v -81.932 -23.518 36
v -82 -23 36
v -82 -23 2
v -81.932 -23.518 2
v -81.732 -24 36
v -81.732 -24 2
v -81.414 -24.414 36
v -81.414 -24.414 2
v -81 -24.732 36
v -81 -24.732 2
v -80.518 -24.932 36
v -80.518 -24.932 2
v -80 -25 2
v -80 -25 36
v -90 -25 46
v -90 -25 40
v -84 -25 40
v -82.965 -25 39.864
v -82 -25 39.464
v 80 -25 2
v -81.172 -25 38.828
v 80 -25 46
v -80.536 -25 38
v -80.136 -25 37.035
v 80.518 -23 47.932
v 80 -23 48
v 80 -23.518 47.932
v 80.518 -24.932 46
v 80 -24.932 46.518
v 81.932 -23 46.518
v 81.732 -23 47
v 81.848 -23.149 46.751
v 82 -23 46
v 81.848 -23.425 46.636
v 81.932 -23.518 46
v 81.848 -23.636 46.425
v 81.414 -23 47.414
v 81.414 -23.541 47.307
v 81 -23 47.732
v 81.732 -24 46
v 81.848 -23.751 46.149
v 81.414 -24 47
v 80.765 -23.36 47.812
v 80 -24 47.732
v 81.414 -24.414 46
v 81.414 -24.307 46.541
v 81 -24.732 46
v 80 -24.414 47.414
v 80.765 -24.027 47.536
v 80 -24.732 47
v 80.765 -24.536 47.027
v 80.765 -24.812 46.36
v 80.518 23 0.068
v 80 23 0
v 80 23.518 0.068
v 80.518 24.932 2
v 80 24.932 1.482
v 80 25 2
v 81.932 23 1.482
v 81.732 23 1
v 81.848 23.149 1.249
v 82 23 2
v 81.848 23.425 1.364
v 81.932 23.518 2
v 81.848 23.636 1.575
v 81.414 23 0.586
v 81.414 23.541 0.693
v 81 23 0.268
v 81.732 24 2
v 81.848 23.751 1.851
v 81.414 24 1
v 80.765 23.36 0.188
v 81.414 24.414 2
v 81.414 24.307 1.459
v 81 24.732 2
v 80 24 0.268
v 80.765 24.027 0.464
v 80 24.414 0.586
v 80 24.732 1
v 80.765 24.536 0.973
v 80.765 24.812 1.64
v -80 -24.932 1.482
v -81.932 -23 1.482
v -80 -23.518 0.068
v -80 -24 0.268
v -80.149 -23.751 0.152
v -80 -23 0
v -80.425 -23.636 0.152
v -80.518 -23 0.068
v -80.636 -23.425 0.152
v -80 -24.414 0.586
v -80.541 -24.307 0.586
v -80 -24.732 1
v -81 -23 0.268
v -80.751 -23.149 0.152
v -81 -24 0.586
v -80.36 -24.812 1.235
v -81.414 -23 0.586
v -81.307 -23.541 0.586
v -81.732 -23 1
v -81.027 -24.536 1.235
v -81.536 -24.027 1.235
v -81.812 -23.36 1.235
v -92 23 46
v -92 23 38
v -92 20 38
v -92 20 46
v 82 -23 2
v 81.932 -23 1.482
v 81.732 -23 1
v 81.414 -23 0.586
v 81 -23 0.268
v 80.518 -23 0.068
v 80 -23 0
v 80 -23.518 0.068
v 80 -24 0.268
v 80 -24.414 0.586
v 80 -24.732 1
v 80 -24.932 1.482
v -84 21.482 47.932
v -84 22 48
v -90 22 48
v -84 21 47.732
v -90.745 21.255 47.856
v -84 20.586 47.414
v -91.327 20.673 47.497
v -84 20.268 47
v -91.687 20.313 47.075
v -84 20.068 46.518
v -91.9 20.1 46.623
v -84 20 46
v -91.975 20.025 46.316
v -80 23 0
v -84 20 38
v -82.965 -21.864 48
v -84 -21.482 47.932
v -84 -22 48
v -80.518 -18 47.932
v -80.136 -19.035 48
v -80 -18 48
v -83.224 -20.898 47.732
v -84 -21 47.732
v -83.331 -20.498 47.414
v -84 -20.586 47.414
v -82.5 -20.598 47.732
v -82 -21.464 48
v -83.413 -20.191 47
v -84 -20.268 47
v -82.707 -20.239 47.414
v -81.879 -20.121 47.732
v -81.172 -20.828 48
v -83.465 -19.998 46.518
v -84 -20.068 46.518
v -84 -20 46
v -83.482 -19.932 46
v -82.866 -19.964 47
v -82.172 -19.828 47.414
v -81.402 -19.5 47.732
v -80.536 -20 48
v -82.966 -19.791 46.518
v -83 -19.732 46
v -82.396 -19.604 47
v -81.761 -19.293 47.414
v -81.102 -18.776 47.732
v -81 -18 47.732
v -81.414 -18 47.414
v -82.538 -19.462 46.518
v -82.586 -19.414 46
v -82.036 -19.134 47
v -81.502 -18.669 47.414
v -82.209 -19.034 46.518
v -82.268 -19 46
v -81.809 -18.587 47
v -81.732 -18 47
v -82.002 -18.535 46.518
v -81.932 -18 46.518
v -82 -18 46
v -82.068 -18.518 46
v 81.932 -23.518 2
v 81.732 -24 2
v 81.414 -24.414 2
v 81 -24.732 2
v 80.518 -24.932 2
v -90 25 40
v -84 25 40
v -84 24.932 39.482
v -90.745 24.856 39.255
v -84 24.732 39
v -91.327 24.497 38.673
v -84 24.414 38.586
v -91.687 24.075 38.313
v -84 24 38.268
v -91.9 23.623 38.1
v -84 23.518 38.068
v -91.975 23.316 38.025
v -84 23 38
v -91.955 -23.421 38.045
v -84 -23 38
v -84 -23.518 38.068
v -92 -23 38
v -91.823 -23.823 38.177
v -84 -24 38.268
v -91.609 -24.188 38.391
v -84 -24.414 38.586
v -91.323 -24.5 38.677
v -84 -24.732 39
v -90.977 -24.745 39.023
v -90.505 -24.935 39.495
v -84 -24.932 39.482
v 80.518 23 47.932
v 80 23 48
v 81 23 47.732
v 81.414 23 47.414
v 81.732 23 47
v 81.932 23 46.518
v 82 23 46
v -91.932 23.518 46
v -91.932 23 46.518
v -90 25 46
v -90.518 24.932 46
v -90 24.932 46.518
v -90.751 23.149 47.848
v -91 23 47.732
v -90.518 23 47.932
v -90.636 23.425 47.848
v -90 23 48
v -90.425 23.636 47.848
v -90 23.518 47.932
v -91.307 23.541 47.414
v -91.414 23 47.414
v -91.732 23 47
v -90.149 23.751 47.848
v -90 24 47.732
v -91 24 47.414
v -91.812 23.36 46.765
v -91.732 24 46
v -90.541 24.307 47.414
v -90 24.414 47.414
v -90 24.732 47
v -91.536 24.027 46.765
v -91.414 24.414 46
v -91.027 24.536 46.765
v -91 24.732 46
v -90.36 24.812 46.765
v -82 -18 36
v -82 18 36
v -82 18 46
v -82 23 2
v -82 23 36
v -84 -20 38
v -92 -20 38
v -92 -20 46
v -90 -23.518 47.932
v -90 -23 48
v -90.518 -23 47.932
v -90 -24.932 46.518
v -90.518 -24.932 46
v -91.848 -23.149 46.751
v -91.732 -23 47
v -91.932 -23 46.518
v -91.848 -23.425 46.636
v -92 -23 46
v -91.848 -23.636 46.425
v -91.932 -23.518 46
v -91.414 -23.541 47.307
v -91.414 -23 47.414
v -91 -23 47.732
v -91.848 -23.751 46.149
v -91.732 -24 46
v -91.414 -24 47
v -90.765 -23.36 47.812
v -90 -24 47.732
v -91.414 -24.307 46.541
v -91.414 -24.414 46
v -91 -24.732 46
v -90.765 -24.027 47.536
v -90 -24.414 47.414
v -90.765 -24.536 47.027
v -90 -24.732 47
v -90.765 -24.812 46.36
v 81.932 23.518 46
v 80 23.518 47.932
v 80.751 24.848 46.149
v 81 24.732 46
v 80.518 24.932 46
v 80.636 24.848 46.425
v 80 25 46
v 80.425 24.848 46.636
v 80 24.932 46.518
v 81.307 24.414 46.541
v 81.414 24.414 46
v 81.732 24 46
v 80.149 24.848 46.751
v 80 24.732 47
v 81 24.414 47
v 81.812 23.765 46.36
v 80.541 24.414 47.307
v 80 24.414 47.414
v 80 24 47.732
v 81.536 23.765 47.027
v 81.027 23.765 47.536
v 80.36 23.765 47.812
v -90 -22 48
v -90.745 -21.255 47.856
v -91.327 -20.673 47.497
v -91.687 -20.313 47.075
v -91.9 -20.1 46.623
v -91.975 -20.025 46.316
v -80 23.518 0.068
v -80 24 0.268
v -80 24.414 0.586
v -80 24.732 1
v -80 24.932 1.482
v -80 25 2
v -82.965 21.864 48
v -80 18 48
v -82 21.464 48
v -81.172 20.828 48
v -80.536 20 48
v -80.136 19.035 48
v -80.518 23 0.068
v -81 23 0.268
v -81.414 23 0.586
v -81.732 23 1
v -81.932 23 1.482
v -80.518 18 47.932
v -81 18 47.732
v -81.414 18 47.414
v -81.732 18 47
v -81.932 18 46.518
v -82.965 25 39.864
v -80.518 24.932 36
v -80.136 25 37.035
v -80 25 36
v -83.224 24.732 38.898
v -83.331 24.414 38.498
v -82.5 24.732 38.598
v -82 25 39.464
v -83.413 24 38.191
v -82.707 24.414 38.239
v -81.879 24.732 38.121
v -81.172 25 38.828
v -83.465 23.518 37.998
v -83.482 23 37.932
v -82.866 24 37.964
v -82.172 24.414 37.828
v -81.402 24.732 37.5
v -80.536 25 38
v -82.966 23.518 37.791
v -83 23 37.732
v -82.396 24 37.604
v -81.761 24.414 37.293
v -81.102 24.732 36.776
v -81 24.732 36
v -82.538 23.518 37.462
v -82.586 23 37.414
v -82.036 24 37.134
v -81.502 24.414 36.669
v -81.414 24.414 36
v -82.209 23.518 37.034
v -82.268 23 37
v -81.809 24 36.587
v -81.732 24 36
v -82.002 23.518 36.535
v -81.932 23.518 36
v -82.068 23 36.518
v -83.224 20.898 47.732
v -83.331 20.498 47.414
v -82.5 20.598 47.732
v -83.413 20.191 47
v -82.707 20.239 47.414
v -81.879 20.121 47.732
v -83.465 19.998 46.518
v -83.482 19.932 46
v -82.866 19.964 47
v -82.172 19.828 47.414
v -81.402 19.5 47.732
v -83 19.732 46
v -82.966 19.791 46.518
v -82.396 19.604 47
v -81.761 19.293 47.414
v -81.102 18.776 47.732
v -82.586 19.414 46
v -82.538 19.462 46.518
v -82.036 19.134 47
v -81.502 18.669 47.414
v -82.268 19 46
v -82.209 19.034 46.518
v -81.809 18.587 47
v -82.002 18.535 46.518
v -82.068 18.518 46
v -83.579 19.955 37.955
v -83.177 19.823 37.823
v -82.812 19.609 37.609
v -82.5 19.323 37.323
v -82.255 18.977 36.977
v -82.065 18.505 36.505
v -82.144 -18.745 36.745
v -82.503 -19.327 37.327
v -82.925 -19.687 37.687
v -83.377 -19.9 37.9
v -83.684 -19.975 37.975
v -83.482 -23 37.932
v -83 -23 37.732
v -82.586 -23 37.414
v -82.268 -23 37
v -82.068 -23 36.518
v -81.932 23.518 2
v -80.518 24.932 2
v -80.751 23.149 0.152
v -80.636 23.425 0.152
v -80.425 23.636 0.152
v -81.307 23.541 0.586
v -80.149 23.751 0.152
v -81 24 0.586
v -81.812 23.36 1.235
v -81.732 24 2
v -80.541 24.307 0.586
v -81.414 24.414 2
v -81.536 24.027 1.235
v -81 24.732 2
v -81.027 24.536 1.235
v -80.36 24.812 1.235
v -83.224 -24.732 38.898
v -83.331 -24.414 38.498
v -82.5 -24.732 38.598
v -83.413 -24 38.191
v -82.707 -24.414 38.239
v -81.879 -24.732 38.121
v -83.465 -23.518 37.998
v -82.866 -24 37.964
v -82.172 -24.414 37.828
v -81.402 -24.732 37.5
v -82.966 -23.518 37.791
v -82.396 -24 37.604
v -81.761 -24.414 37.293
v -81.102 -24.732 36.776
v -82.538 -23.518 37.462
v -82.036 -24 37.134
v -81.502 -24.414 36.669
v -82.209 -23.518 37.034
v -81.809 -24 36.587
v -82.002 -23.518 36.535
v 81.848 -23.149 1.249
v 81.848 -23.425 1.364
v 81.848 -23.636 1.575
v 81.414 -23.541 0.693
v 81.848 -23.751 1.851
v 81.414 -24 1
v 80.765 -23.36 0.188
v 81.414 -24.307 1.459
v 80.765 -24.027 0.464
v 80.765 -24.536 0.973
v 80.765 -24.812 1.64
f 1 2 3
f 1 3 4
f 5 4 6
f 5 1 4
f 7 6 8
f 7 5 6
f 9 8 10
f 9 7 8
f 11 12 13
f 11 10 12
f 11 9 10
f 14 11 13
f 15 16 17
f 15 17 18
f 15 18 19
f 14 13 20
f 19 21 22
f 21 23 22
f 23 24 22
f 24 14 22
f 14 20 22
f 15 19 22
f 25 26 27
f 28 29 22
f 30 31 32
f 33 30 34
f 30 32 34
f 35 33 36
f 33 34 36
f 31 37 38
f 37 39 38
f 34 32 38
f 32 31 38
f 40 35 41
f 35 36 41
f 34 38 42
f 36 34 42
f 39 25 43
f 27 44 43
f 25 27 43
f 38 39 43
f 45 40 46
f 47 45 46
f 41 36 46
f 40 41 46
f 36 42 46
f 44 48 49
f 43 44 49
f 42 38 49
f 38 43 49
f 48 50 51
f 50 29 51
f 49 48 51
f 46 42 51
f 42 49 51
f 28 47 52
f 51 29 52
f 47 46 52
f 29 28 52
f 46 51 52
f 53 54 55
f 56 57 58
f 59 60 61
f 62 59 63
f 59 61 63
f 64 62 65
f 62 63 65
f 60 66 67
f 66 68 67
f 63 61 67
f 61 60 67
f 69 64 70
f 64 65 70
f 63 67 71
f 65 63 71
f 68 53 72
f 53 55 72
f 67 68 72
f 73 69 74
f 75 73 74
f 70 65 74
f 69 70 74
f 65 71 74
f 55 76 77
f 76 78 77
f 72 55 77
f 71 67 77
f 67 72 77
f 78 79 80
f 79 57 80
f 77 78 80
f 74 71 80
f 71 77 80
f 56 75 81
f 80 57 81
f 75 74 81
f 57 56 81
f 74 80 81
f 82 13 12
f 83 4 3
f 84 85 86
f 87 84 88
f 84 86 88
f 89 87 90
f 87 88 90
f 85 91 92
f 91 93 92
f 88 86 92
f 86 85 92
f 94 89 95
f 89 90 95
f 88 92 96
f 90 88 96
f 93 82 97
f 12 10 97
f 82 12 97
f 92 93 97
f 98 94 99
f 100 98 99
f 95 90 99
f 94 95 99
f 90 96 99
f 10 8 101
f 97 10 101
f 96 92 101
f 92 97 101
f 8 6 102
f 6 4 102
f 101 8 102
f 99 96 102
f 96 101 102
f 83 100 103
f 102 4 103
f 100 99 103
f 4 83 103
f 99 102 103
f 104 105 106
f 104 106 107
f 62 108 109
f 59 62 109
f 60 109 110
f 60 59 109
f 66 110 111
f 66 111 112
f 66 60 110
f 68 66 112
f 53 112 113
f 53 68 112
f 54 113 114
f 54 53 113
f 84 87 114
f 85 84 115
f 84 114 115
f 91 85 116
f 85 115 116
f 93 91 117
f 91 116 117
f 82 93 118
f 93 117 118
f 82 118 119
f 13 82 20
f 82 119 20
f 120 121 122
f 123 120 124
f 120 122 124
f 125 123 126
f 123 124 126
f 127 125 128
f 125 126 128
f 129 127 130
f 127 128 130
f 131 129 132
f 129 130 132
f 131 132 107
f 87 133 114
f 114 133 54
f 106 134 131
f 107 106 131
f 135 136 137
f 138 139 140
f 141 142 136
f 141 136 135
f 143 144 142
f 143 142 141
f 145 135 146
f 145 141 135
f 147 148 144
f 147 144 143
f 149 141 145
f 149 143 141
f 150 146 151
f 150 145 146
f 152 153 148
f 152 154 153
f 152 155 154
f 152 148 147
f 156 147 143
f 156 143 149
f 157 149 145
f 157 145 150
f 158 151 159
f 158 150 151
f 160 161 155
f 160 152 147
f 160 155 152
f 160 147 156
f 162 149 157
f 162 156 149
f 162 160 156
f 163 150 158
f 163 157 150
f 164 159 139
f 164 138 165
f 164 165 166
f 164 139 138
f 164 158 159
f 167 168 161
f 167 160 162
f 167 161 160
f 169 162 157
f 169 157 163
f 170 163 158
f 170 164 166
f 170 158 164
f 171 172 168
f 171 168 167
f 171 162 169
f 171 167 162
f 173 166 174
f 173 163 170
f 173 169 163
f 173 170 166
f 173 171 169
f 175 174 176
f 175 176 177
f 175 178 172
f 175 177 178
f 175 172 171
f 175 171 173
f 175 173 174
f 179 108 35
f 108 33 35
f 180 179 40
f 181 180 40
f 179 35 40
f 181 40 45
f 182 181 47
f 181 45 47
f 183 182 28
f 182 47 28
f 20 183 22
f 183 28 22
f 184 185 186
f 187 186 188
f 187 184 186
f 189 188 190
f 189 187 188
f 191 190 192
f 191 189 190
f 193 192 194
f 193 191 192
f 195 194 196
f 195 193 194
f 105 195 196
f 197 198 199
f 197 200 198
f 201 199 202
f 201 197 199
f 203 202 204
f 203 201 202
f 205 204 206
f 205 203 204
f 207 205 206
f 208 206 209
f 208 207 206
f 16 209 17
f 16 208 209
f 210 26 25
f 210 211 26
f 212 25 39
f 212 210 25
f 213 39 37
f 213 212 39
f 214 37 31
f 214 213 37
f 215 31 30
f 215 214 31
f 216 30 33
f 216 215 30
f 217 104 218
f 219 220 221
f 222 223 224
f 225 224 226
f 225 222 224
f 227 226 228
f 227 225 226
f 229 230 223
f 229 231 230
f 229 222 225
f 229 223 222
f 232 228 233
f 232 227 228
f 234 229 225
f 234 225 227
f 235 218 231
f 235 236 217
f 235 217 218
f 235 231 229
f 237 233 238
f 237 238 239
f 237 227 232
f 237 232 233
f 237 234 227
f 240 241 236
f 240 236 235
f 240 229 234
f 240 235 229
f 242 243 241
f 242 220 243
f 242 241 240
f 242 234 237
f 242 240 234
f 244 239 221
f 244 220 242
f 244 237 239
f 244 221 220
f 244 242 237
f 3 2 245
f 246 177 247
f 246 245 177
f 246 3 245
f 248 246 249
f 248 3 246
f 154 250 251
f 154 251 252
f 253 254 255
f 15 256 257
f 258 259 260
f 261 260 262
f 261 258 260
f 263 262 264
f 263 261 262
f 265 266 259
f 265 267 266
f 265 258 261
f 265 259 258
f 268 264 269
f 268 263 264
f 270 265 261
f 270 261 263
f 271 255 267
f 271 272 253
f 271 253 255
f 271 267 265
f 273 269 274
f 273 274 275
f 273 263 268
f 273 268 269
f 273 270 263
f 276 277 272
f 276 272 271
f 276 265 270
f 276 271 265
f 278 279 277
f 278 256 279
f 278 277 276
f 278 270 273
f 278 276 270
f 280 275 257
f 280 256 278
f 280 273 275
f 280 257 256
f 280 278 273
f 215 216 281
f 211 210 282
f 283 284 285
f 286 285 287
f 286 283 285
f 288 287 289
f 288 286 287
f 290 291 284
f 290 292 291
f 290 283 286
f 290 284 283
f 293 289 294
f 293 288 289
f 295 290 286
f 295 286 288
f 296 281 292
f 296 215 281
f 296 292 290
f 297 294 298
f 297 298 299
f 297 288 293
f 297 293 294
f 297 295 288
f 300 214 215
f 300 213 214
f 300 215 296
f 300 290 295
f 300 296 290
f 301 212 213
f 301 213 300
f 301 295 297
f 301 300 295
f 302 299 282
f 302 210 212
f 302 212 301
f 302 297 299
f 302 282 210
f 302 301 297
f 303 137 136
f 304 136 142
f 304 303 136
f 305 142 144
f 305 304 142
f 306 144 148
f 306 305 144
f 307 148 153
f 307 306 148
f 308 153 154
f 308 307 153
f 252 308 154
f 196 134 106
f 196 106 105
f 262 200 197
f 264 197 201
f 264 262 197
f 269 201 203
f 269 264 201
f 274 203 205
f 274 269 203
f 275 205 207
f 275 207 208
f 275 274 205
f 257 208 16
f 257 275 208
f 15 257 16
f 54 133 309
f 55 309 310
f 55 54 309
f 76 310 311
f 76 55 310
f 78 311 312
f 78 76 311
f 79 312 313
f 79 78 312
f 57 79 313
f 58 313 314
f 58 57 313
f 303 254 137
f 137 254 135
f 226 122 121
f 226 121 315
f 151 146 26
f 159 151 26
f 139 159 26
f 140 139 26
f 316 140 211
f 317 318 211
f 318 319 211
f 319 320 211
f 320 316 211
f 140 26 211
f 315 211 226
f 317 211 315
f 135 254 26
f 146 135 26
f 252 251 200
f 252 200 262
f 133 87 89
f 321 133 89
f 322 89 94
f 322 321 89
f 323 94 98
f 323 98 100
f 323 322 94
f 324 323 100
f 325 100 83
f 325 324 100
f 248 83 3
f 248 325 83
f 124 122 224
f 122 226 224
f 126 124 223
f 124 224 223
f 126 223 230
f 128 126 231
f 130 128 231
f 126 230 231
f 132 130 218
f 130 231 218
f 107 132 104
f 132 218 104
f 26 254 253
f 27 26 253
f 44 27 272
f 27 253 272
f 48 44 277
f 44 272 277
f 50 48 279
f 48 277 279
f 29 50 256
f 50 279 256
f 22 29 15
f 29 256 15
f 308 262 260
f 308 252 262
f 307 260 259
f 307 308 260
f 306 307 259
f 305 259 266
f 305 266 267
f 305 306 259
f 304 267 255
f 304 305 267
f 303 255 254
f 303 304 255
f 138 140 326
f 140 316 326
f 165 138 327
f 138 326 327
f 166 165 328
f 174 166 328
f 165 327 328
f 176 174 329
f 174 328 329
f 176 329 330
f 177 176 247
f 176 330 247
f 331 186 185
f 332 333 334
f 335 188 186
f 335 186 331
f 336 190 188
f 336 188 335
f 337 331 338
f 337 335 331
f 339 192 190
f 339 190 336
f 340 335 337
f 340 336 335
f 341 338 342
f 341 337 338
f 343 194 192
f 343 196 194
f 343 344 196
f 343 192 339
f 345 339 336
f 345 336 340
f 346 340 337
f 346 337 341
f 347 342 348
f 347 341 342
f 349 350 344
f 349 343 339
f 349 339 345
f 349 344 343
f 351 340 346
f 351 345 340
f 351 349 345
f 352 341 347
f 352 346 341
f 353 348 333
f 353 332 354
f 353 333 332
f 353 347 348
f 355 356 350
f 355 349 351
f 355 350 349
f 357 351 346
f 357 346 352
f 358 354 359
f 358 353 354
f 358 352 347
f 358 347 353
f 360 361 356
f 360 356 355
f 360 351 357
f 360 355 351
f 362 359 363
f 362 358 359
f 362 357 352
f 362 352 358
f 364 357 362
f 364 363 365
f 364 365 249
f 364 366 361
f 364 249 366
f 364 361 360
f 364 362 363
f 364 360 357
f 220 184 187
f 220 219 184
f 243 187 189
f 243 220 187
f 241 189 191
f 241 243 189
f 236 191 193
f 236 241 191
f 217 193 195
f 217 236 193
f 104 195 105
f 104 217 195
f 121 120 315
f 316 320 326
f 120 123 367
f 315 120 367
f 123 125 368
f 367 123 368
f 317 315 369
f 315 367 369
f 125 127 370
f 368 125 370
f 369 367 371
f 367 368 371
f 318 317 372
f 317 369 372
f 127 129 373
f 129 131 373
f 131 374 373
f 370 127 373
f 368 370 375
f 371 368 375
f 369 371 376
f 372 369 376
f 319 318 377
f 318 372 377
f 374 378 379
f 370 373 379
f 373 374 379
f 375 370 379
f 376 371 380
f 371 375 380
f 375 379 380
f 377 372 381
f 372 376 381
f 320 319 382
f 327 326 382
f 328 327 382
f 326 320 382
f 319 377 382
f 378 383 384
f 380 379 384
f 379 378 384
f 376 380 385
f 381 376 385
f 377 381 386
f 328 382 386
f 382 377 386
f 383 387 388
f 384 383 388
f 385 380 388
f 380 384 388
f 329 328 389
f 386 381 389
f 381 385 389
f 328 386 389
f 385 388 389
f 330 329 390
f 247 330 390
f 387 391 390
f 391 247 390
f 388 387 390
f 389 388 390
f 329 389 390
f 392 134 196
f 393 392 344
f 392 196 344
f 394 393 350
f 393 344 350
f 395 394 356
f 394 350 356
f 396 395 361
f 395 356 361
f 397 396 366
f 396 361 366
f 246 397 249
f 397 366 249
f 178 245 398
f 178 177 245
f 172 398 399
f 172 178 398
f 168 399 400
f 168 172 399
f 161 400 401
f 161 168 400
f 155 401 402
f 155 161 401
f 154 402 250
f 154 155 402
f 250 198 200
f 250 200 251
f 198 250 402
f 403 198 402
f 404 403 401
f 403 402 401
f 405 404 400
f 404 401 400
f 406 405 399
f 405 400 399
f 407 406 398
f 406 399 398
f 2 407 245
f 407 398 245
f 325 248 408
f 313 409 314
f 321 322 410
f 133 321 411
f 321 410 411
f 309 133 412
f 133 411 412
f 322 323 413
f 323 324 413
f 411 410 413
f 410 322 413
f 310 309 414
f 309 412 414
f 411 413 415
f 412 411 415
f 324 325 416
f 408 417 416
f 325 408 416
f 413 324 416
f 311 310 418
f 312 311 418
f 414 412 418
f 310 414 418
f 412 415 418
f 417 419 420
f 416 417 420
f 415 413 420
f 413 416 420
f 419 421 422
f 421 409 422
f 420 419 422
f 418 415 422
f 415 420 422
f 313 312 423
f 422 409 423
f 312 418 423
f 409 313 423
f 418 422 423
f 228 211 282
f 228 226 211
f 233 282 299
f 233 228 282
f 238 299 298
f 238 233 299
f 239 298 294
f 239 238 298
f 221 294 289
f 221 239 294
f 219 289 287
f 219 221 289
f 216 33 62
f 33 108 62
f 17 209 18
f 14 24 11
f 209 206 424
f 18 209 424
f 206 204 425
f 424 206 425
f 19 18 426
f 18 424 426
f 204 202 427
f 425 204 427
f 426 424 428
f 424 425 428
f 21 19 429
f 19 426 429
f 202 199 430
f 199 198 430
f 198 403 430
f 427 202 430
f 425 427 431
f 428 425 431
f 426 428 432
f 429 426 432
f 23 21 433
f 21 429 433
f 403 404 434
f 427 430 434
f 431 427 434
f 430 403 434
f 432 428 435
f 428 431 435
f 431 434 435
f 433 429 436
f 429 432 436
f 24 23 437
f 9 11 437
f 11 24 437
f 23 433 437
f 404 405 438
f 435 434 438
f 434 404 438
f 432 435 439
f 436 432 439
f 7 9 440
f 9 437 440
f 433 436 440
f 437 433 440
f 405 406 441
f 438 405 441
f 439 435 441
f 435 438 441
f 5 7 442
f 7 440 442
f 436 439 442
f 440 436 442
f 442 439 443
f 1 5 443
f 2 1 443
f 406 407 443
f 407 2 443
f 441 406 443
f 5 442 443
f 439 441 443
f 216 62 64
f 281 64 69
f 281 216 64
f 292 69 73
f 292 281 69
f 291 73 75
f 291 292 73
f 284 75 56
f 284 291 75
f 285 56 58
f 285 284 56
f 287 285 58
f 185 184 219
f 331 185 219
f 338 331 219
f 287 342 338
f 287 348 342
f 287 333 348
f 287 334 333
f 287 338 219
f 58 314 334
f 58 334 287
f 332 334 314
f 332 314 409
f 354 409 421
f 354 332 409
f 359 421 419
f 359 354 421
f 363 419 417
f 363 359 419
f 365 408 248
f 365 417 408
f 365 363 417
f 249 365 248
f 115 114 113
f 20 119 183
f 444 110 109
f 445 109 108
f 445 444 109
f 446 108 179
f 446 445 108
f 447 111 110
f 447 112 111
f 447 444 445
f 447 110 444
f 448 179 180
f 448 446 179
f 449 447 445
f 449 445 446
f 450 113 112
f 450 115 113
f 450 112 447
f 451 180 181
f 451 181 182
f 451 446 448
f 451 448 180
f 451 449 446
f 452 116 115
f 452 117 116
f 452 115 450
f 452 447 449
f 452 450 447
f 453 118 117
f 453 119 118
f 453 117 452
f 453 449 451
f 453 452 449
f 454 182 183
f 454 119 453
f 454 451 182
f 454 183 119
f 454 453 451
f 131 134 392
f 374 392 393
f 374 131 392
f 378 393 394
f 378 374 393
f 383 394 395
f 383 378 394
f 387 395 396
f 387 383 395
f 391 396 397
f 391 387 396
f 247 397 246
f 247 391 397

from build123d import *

# Parameters (mm, degrees)
SKETCH1_W           = 164
SKETCH1_H           = 50
BOSS_EXTRUDE1_DEPTH = 48
SKETCH2_W           = 10
SKETCH2_H           = 5
BOSS_EXTRUDE2_DEPTH = 10
FILLET1_R           = 2


with BuildPart() as part:
    # Sketch1 → Boss-Extrude1 (new body)
    with BuildSketch(Plane.XY):
        Rectangle(SKETCH1_W, SKETCH1_H)
    extrude(amount=BOSS_EXTRUDE1_DEPTH)

    # Sketch2 → Boss-Extrude2 (add)
    with BuildSketch(Plane.ZY.offset(82)):
        with Locations((43, -22.5)):
            Rectangle(SKETCH2_W, SKETCH2_H)
        with Locations((43, 22.5)):
            Rectangle(SKETCH2_W, SKETCH2_H)
    extrude(amount=BOSS_EXTRUDE2_DEPTH)

    # Fillet1
    fillet1_edges = [part.edges().sort_by_distance(p)[0] for p in [
        (-82, 0, 48),
        (-82, 25, 19),
        (-82, 22.5, 38),
        (-87, 25, 38),
        (-5, -25, 48),
        (-82, 20, 43),
        (-87, 20, 48),
        (-92, 25, 43),
        (-92, 22.5, 48),
        (-82, -25, 19),
        (-82, -20, 43),
        (-87, -20, 48),
        (-82, -22.5, 38),
        (-87, -25, 38),
        (-92, -22.5, 48),
        (-92, -25, 43),
        (82, 0, 48),
        (0, -25, 0),
        (-82, 0, 0),
        (0, 25, 0),
        (82, 0, 0),
        (82, -25, 24),
        (82, 25, 24),
        (-5, 25, 48),
    ]]
    fillet(fillet1_edges, radius=FILLET1_R)


solid = part.part
